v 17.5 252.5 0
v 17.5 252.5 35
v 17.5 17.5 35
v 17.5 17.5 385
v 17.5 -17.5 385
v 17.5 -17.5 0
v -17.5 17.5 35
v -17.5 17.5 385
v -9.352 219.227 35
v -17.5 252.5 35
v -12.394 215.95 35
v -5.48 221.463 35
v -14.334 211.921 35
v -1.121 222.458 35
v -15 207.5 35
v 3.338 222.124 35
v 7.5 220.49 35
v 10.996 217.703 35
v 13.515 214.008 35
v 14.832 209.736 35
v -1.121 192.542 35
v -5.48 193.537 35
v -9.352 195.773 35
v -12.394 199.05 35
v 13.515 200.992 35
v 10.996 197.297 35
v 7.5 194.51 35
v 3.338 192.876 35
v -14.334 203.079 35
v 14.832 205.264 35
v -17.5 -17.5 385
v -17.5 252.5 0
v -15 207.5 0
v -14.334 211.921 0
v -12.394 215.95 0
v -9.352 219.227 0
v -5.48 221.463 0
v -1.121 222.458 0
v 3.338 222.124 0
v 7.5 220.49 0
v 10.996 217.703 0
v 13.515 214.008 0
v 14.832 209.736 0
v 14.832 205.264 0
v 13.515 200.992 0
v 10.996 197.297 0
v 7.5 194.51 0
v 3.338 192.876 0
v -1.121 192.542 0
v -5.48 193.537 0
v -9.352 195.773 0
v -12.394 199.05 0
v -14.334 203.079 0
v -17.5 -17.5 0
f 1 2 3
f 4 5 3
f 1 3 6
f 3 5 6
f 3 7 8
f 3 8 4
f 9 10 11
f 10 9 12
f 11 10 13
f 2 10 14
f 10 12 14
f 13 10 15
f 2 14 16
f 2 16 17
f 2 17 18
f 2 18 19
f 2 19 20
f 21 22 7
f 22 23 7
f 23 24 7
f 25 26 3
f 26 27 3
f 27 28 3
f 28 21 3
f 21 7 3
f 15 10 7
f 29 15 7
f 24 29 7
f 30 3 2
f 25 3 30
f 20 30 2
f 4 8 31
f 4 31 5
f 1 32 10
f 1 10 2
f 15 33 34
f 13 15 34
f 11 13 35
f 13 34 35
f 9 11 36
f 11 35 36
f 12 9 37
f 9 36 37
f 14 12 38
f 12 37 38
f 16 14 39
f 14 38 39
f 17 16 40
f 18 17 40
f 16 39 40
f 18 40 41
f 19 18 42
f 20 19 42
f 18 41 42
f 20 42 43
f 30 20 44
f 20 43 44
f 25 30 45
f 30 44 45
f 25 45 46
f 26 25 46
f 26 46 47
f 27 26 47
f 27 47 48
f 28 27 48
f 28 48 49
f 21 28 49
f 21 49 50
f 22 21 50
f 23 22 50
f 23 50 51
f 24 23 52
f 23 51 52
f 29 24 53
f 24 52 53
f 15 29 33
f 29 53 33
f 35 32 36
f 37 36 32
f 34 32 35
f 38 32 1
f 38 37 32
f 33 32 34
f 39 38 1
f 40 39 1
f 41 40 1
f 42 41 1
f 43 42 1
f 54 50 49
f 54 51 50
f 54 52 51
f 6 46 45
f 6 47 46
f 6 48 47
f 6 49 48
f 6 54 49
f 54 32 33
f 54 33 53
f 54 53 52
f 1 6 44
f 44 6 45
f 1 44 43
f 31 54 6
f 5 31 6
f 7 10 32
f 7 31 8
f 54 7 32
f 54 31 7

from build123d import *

# Parameters (mm, degrees)
CROQUIS1_W              = 35
CROQUIS1_H              = 35
SALIENTE_EXTRUIR1_DEPTH = 385
CROQUIS2_W              = 35
CROQUIS2_H              = 35
SALIENTE_EXTRUIR2_DEPTH = 235
CROQUIS3_R              = 15
CORTAR_EXTRUIR1_DEPTH   = 35


with BuildPart() as part:
    # Croquis1 → Saliente-Extruir1 (new body)
    with BuildSketch(Plane.XY):
        Rectangle(CROQUIS1_W, CROQUIS1_H)
    extrude(amount=SALIENTE_EXTRUIR1_DEPTH)

    # Croquis2 → Saliente-Extruir2 (add)
    with BuildSketch(Plane(origin=(0, 17.5, 0), x_dir=(1, 0, 0), z_dir=(0, 1, 0))):
        with Locations((0, -17.5)):
            Rectangle(CROQUIS2_W, CROQUIS2_H)
    extrude(amount=SALIENTE_EXTRUIR2_DEPTH)

    # Croquis3 → Cortar-Extruir1 (cut)
    with BuildSketch(Plane(origin=(0, 0, 0), x_dir=(-1, 0, 0), z_dir=(0, 0, -1))):
        with Locations((0, 207.5)):
            Circle(CROQUIS3_R)
    extrude(amount=-CORTAR_EXTRUIR1_DEPTH, mode=Mode.SUBTRACT)


solid = part.part
